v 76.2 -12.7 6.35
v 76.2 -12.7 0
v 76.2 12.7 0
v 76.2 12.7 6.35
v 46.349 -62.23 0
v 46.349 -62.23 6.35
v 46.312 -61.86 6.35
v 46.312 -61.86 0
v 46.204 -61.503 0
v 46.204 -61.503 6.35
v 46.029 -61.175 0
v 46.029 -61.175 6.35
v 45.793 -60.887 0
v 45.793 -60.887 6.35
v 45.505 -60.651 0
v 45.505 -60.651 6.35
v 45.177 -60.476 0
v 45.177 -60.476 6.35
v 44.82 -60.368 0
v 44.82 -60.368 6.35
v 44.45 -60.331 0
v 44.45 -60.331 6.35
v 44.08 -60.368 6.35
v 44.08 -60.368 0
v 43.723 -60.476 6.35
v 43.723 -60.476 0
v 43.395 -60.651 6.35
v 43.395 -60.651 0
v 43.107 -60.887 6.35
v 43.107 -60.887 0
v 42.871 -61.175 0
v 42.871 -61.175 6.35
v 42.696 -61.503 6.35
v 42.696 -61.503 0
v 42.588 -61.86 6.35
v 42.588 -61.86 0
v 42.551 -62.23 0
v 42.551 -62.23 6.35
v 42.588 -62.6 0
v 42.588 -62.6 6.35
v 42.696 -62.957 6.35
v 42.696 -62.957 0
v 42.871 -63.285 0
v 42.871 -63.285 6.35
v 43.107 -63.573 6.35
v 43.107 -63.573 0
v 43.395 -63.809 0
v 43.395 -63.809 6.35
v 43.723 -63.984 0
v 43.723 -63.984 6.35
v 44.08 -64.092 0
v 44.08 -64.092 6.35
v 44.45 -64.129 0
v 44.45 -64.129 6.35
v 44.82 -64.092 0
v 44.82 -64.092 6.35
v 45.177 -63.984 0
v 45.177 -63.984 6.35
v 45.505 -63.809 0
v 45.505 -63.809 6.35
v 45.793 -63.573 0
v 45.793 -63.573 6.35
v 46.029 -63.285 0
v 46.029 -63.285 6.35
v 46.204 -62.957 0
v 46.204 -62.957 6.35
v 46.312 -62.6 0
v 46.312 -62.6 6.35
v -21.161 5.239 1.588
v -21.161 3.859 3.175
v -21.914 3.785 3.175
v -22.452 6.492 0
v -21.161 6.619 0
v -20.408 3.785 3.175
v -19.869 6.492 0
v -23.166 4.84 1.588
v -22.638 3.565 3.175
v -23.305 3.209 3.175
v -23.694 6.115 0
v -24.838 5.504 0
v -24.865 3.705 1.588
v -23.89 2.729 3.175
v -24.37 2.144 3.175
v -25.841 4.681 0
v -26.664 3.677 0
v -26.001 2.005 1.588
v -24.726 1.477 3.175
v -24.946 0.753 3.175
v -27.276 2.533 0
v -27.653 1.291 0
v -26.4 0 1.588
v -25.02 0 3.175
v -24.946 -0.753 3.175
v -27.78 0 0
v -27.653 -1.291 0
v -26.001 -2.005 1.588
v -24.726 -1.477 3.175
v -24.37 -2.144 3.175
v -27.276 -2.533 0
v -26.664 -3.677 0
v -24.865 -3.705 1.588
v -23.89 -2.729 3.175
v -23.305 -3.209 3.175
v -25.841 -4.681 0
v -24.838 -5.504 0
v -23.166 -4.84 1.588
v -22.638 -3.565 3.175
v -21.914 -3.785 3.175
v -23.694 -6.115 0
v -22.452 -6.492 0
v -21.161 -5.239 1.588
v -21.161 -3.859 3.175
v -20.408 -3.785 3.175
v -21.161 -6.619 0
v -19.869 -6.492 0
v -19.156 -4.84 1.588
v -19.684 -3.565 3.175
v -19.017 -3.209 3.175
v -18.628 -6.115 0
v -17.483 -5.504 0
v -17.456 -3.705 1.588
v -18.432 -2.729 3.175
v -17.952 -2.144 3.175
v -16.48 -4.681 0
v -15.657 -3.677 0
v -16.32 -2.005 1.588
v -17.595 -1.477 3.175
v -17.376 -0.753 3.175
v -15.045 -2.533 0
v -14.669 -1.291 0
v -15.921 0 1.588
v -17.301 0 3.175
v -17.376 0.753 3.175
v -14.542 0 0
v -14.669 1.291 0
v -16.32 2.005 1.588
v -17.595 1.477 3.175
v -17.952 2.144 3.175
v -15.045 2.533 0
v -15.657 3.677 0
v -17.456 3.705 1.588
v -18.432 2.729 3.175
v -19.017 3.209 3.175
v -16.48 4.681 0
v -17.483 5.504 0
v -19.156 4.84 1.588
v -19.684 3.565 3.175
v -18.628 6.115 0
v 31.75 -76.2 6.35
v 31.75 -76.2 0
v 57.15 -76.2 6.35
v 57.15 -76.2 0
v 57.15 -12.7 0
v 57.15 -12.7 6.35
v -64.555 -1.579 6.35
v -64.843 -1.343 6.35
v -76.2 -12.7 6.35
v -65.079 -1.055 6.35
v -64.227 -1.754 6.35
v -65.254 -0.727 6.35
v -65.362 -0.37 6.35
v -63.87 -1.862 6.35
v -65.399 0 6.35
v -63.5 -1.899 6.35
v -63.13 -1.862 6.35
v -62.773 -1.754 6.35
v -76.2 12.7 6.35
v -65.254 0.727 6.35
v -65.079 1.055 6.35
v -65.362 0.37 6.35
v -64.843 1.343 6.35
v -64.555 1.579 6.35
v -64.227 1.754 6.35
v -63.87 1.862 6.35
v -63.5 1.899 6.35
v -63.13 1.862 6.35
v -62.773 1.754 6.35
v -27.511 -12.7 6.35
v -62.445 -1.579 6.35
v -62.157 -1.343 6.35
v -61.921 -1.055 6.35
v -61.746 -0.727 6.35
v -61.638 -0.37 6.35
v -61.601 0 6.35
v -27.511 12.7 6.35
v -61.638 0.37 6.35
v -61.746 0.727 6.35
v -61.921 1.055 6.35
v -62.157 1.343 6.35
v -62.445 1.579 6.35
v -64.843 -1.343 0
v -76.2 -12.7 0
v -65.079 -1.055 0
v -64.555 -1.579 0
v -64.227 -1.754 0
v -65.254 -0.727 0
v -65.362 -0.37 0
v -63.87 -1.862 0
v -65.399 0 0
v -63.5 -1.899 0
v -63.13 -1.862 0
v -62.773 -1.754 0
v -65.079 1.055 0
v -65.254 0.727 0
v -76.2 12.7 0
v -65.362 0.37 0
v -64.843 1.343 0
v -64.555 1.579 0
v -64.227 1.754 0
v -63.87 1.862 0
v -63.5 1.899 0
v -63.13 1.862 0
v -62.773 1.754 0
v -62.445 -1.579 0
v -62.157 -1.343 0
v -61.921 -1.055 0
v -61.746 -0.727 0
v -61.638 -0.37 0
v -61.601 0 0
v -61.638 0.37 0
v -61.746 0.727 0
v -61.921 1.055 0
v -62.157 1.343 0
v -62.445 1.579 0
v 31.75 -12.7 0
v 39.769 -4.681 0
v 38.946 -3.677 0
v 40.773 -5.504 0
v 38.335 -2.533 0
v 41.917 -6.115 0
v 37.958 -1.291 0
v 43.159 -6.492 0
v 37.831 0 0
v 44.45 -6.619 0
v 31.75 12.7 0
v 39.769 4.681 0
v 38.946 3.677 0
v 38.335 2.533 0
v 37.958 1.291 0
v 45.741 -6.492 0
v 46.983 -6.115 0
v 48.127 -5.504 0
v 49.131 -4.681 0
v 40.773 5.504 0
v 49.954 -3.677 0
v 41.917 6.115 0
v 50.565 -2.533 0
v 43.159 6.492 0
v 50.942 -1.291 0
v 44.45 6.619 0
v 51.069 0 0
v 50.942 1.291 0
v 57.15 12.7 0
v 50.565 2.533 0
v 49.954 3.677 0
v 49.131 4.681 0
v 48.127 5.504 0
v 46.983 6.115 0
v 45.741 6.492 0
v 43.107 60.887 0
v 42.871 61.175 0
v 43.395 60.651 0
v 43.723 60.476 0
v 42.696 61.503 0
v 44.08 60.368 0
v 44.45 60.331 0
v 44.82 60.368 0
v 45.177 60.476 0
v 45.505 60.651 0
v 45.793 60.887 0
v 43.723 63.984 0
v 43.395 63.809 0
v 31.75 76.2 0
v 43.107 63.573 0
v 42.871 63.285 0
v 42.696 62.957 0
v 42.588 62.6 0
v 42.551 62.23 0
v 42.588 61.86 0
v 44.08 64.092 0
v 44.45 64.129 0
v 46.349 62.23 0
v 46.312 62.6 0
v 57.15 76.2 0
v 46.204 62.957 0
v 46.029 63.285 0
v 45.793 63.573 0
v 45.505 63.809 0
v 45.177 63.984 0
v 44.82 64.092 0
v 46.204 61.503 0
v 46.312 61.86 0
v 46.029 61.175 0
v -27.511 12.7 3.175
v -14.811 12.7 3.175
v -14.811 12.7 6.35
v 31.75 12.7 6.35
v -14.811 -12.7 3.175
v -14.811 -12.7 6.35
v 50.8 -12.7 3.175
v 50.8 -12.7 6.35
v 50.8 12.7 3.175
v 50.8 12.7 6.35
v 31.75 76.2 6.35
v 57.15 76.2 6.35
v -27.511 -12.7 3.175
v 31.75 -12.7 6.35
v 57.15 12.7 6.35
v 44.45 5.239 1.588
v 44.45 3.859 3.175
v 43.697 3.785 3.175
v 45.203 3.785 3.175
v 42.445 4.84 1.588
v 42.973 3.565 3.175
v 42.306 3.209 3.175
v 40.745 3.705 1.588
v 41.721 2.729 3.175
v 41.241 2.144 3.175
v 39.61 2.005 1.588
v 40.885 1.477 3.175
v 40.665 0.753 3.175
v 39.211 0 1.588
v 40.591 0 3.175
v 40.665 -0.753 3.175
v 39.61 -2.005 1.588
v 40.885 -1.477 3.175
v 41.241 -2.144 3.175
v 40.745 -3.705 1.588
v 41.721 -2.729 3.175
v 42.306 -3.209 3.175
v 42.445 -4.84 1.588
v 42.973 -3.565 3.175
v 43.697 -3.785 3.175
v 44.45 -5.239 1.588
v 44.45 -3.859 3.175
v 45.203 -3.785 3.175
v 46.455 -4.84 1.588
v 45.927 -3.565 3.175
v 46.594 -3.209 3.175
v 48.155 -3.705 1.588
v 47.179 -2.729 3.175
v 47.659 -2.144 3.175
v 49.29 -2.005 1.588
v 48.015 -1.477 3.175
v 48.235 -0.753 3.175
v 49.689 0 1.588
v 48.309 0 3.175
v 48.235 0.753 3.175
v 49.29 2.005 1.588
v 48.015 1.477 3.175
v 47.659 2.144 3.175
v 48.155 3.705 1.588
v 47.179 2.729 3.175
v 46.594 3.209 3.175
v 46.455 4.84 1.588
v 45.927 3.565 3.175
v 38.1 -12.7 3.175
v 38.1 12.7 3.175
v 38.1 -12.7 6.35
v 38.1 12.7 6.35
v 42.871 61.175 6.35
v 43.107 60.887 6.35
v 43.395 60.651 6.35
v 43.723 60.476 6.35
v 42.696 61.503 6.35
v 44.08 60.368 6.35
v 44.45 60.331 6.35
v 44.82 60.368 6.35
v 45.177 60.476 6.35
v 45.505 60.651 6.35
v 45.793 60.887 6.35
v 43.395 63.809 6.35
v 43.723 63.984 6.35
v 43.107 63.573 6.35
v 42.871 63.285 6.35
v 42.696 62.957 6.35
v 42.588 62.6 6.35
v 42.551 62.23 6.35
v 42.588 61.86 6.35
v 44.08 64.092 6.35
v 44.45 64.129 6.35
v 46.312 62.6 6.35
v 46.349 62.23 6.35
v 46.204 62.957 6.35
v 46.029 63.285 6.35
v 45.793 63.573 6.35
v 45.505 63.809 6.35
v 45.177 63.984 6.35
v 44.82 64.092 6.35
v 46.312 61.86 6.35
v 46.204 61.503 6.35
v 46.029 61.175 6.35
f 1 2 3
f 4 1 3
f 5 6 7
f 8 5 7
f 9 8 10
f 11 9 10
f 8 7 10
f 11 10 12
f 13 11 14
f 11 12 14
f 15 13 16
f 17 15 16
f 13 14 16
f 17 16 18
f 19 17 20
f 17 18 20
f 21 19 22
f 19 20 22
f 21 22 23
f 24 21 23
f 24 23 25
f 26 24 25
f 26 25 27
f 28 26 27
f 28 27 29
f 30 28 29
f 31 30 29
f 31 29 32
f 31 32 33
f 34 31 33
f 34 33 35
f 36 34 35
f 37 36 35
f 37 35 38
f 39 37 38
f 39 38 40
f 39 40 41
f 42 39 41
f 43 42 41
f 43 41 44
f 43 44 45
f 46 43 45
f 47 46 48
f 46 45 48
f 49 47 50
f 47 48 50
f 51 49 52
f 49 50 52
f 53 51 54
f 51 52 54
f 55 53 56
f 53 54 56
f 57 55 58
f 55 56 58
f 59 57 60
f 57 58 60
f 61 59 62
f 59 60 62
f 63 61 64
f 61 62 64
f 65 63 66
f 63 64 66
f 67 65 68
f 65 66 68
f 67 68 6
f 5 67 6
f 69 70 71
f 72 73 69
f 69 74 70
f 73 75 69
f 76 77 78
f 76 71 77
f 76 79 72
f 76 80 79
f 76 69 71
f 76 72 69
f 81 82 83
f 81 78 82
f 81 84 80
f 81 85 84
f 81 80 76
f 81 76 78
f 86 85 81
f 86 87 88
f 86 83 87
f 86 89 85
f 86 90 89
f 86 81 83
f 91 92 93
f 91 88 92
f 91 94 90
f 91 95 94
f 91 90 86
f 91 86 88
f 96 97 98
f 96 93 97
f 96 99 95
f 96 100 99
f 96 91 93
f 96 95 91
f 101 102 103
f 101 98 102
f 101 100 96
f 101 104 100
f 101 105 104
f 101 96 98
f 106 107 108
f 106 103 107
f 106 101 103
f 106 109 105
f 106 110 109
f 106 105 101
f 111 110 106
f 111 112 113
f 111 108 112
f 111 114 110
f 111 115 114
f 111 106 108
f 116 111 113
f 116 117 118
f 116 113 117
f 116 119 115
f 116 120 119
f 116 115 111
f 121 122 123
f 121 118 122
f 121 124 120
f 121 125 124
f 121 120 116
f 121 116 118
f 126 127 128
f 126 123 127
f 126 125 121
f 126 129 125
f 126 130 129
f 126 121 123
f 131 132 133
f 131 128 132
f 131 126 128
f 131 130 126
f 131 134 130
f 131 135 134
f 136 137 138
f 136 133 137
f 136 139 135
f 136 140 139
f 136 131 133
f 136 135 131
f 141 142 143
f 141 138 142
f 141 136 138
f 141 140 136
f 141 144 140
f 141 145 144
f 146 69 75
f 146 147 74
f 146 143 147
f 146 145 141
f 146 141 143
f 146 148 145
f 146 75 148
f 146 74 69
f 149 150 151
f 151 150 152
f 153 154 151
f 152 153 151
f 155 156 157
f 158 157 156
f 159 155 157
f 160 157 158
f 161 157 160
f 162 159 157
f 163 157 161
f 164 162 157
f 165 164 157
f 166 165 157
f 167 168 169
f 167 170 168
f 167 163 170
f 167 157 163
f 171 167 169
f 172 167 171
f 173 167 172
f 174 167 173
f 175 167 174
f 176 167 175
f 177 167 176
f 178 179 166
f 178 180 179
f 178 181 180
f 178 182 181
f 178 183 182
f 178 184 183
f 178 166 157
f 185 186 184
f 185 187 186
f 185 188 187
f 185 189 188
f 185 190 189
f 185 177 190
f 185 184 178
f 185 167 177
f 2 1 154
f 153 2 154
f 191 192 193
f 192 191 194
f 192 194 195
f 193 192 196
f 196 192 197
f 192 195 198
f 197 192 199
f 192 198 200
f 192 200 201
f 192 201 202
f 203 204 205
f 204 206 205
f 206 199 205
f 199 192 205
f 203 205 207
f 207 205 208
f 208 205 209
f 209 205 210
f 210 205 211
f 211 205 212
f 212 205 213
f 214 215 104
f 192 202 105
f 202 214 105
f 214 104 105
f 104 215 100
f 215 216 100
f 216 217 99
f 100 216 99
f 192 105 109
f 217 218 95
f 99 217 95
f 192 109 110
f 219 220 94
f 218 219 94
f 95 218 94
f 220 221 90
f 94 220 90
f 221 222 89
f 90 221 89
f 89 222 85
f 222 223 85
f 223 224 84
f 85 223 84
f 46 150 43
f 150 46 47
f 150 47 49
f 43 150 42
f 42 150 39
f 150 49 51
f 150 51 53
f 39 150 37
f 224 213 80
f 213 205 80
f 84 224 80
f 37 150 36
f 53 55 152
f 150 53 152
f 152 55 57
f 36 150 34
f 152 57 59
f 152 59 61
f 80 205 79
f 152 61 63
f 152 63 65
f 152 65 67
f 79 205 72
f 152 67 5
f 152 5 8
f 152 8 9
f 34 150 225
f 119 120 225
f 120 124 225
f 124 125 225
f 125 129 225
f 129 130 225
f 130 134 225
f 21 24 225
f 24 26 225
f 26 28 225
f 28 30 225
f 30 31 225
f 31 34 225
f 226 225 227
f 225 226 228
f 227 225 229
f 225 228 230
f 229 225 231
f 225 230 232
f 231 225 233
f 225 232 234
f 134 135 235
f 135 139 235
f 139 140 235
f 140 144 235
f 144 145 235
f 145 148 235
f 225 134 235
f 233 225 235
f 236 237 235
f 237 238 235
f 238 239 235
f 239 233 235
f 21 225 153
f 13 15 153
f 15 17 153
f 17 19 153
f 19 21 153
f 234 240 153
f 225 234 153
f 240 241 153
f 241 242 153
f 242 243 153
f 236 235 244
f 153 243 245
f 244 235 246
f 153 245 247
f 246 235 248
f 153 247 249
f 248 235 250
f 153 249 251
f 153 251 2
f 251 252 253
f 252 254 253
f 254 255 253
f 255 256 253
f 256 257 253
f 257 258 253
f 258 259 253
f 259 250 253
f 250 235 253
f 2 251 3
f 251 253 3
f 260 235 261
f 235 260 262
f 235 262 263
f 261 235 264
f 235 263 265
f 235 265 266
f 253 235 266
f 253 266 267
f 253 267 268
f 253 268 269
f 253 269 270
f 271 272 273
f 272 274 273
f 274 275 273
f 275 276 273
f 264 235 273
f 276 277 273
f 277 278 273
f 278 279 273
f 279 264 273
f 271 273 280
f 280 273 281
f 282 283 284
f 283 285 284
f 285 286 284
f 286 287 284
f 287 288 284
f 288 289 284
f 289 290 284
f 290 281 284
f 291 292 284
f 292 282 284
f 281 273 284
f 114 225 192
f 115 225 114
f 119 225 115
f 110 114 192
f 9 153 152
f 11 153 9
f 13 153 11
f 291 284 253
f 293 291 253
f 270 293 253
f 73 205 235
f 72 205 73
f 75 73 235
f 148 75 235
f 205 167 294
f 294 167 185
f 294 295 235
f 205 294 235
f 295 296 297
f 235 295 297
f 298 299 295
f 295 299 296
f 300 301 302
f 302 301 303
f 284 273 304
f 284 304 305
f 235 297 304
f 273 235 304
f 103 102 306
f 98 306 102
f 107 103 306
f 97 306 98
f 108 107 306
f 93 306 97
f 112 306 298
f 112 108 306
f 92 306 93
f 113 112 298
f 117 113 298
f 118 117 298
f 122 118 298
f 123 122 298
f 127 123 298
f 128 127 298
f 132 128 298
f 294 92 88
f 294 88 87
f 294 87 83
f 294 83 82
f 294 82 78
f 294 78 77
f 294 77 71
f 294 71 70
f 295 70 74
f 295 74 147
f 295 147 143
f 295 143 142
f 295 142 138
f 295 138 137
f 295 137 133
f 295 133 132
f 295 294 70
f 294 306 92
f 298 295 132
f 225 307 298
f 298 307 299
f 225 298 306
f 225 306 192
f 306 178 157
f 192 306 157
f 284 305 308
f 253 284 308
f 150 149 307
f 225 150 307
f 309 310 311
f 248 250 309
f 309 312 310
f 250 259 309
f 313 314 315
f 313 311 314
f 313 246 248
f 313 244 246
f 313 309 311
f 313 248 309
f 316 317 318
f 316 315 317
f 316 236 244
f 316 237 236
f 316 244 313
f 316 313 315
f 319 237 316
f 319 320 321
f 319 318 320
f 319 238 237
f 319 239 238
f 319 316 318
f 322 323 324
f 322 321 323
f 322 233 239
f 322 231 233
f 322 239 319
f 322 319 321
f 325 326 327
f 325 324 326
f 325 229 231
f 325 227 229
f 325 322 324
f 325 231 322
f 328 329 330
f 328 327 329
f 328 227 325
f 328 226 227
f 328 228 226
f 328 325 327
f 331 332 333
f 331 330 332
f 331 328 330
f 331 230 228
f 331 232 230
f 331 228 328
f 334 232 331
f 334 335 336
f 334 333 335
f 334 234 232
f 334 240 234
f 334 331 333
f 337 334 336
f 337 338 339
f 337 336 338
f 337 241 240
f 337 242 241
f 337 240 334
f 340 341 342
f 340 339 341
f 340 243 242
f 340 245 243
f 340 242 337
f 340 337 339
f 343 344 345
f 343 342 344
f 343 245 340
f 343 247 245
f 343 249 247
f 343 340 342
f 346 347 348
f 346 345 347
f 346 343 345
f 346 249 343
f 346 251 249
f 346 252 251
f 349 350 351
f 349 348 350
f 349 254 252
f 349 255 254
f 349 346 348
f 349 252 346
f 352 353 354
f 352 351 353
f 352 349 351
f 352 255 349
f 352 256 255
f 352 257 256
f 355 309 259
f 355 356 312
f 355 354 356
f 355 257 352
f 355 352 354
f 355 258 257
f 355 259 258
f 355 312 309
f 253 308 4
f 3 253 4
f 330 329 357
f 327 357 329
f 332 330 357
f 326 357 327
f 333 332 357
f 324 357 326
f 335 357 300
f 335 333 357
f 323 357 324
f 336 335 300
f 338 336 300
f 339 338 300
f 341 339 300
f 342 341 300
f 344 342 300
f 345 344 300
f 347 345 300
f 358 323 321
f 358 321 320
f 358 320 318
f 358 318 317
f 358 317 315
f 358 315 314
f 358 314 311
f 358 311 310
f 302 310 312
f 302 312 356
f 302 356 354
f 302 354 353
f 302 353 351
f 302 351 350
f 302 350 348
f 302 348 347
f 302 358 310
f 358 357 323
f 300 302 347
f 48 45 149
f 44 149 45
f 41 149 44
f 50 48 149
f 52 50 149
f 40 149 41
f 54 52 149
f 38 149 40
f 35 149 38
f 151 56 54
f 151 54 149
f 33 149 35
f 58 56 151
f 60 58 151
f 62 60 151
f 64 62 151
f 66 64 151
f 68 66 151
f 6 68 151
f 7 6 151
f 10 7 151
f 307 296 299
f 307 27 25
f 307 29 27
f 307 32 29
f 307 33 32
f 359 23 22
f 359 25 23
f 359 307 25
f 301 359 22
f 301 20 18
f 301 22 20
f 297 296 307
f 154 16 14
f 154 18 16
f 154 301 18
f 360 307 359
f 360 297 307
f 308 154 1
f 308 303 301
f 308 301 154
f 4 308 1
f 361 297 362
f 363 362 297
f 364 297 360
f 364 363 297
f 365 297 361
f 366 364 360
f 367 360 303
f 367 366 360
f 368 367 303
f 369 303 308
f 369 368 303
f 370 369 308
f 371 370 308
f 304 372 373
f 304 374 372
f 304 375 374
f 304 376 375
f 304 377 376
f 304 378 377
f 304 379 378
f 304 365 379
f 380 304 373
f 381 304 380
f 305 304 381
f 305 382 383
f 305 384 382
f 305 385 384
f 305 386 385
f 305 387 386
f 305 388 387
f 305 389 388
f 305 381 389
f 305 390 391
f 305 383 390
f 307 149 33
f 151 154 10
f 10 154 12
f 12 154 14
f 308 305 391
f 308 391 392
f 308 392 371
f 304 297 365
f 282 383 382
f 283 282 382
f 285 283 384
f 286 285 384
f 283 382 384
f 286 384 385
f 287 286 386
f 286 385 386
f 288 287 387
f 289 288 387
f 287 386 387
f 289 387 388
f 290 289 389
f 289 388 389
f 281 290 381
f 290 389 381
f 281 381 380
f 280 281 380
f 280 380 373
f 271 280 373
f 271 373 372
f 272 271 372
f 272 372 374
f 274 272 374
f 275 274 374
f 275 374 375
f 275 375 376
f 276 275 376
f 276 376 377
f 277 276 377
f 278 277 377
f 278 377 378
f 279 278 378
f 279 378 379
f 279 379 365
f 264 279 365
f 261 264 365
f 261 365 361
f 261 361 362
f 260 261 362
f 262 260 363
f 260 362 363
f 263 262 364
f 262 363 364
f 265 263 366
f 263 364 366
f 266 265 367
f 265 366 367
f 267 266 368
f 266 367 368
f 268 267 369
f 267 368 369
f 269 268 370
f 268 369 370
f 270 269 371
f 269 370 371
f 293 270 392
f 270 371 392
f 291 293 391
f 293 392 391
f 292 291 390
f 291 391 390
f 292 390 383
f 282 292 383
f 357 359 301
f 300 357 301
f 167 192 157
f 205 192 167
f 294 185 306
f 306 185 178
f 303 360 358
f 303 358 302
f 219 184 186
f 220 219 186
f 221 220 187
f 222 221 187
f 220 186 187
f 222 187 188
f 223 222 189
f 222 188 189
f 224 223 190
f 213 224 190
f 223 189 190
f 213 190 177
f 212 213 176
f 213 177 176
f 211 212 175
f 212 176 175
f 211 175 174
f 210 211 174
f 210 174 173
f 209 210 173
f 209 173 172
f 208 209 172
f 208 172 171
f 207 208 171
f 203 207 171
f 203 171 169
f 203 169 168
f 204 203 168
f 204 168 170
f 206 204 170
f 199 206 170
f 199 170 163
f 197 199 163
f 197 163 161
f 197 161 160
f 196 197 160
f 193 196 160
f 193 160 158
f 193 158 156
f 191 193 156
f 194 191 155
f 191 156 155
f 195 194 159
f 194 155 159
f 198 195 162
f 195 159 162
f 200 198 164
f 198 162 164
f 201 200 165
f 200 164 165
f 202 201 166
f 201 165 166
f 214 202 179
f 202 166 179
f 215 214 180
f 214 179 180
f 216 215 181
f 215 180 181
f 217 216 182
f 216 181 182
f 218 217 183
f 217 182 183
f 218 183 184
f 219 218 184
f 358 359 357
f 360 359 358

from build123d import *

# Parameters (mm, degrees)
SKETCH1_W                  = 152.4
SKETCH1_H                  = 152.4
EXTRUDE1_DEPTH             = 6.35
SKETCH3_OUTSIDE_W          = 197.524
SKETCH3_OUTSIDE_H          = 197.524
EXTRUDE3_DEPTH             = 108.95
F_10_24_TAPPED_HOLE2_D     = 3.7973
F_10_24_TAPPED_HOLE2_DEPTH = 14.986
F_10_24_TAPPED_HOLE2_TIP   = 1.140824014
EXTRUDE4_DEPTH             = 3.175
SKETCH20_W                 = 12.7
SKETCH20_H                 = 25.4
EXTRUDE5_DEPTH             = 3.175


with BuildPart() as part:
    # Sketch1 → Extrude1 (new body)
    with BuildSketch(Plane.XY):
        Rectangle(SKETCH1_W, SKETCH1_H)
    extrude(amount=EXTRUDE1_DEPTH)

    # Sketch3 outside → Extrude3 (cut, through all)
    with BuildSketch(Plane.XY.offset(6.35)):
        Rectangle(SKETCH3_OUTSIDE_W, SKETCH3_OUTSIDE_H)
        Polygon((57.15, 76.2), (57.15, 12.7), (76.2, 12.7), (76.2, -12.7), (57.15, -12.7), (57.15, -76.2), (31.75, -76.2), (31.75, -12.7), (-76.2, -12.7), (-76.2, 12.7), (31.75, 12.7), (31.75, 76.2), align=None, mode=Mode.SUBTRACT)
    extrude(amount=-EXTRUDE3_DEPTH, mode=Mode.SUBTRACT)

    # Sketch11 → CSK for 1/4 Flat Head Socket Cap Screw2 (revolve, cut)
    with BuildSketch(Plane(origin=(-21.16074, -8.054e-06, 0), x_dir=(0, 1, 0), z_dir=(1, 0, 0))):
        Polygon((0, 0), (0, 6.35), (3.3782, 6.35), (3.3782, 3.728390023), (6.61924, 0), align=None)
    revolve(axis=Axis((-21.16074, -8.054e-06, -6.35), (0, 0, 1)), mode=Mode.SUBTRACT)

    # Sketch13 → CSK for 1/4 Flat Head Socket Cap Screw3 (revolve, cut)
    with BuildSketch(Plane(origin=(44.45, -8.054e-06, 0), x_dir=(0, 1, 0), z_dir=(1, 0, 0))):
        Polygon((0, 0), (0, 6.35), (3.3782, 6.35), (3.3782, 3.728390023), (6.61924, 0), align=None)
    revolve(axis=Axis((44.45, -8.054e-06, -6.35), (0, 0, 1)), mode=Mode.SUBTRACT)

    # #10-24 Tapped Hole2
    with Locations(Plane(origin=(-63.5, 0, 0), x_dir=(-1, 0, 0), z_dir=(0, 0, -1))):
        with Locations((0, 0), (-107.95, 62.23), (-107.95, -62.23)):
            Hole(F_10_24_TAPPED_HOLE2_D / 2, depth=F_10_24_TAPPED_HOLE2_DEPTH)
            with Locations((0, 0, -(F_10_24_TAPPED_HOLE2_DEPTH + F_10_24_TAPPED_HOLE2_TIP / 2))):  # 118° drill point
                Cone(0, F_10_24_TAPPED_HOLE2_D / 2, F_10_24_TAPPED_HOLE2_TIP, mode=Mode.SUBTRACT)

    # Sketch18 → Extrude4 (cut)
    with BuildSketch(Plane.XY.offset(6.35)):
        Polygon((-27.51074, 12.7), (-27.51074, -12.702586498), (-14.81074, -12.7), (-14.81074, 12.7), align=None)
    extrude(amount=-EXTRUDE4_DEPTH, mode=Mode.SUBTRACT)

    # Sketch20 → Extrude5 (cut)
    with BuildSketch(Plane.XY.offset(6.35)):
        with Locations((44.45, 0)):
            Rectangle(SKETCH20_W, SKETCH20_H)
    extrude(amount=-EXTRUDE5_DEPTH, mode=Mode.SUBTRACT)


solid = part.part
